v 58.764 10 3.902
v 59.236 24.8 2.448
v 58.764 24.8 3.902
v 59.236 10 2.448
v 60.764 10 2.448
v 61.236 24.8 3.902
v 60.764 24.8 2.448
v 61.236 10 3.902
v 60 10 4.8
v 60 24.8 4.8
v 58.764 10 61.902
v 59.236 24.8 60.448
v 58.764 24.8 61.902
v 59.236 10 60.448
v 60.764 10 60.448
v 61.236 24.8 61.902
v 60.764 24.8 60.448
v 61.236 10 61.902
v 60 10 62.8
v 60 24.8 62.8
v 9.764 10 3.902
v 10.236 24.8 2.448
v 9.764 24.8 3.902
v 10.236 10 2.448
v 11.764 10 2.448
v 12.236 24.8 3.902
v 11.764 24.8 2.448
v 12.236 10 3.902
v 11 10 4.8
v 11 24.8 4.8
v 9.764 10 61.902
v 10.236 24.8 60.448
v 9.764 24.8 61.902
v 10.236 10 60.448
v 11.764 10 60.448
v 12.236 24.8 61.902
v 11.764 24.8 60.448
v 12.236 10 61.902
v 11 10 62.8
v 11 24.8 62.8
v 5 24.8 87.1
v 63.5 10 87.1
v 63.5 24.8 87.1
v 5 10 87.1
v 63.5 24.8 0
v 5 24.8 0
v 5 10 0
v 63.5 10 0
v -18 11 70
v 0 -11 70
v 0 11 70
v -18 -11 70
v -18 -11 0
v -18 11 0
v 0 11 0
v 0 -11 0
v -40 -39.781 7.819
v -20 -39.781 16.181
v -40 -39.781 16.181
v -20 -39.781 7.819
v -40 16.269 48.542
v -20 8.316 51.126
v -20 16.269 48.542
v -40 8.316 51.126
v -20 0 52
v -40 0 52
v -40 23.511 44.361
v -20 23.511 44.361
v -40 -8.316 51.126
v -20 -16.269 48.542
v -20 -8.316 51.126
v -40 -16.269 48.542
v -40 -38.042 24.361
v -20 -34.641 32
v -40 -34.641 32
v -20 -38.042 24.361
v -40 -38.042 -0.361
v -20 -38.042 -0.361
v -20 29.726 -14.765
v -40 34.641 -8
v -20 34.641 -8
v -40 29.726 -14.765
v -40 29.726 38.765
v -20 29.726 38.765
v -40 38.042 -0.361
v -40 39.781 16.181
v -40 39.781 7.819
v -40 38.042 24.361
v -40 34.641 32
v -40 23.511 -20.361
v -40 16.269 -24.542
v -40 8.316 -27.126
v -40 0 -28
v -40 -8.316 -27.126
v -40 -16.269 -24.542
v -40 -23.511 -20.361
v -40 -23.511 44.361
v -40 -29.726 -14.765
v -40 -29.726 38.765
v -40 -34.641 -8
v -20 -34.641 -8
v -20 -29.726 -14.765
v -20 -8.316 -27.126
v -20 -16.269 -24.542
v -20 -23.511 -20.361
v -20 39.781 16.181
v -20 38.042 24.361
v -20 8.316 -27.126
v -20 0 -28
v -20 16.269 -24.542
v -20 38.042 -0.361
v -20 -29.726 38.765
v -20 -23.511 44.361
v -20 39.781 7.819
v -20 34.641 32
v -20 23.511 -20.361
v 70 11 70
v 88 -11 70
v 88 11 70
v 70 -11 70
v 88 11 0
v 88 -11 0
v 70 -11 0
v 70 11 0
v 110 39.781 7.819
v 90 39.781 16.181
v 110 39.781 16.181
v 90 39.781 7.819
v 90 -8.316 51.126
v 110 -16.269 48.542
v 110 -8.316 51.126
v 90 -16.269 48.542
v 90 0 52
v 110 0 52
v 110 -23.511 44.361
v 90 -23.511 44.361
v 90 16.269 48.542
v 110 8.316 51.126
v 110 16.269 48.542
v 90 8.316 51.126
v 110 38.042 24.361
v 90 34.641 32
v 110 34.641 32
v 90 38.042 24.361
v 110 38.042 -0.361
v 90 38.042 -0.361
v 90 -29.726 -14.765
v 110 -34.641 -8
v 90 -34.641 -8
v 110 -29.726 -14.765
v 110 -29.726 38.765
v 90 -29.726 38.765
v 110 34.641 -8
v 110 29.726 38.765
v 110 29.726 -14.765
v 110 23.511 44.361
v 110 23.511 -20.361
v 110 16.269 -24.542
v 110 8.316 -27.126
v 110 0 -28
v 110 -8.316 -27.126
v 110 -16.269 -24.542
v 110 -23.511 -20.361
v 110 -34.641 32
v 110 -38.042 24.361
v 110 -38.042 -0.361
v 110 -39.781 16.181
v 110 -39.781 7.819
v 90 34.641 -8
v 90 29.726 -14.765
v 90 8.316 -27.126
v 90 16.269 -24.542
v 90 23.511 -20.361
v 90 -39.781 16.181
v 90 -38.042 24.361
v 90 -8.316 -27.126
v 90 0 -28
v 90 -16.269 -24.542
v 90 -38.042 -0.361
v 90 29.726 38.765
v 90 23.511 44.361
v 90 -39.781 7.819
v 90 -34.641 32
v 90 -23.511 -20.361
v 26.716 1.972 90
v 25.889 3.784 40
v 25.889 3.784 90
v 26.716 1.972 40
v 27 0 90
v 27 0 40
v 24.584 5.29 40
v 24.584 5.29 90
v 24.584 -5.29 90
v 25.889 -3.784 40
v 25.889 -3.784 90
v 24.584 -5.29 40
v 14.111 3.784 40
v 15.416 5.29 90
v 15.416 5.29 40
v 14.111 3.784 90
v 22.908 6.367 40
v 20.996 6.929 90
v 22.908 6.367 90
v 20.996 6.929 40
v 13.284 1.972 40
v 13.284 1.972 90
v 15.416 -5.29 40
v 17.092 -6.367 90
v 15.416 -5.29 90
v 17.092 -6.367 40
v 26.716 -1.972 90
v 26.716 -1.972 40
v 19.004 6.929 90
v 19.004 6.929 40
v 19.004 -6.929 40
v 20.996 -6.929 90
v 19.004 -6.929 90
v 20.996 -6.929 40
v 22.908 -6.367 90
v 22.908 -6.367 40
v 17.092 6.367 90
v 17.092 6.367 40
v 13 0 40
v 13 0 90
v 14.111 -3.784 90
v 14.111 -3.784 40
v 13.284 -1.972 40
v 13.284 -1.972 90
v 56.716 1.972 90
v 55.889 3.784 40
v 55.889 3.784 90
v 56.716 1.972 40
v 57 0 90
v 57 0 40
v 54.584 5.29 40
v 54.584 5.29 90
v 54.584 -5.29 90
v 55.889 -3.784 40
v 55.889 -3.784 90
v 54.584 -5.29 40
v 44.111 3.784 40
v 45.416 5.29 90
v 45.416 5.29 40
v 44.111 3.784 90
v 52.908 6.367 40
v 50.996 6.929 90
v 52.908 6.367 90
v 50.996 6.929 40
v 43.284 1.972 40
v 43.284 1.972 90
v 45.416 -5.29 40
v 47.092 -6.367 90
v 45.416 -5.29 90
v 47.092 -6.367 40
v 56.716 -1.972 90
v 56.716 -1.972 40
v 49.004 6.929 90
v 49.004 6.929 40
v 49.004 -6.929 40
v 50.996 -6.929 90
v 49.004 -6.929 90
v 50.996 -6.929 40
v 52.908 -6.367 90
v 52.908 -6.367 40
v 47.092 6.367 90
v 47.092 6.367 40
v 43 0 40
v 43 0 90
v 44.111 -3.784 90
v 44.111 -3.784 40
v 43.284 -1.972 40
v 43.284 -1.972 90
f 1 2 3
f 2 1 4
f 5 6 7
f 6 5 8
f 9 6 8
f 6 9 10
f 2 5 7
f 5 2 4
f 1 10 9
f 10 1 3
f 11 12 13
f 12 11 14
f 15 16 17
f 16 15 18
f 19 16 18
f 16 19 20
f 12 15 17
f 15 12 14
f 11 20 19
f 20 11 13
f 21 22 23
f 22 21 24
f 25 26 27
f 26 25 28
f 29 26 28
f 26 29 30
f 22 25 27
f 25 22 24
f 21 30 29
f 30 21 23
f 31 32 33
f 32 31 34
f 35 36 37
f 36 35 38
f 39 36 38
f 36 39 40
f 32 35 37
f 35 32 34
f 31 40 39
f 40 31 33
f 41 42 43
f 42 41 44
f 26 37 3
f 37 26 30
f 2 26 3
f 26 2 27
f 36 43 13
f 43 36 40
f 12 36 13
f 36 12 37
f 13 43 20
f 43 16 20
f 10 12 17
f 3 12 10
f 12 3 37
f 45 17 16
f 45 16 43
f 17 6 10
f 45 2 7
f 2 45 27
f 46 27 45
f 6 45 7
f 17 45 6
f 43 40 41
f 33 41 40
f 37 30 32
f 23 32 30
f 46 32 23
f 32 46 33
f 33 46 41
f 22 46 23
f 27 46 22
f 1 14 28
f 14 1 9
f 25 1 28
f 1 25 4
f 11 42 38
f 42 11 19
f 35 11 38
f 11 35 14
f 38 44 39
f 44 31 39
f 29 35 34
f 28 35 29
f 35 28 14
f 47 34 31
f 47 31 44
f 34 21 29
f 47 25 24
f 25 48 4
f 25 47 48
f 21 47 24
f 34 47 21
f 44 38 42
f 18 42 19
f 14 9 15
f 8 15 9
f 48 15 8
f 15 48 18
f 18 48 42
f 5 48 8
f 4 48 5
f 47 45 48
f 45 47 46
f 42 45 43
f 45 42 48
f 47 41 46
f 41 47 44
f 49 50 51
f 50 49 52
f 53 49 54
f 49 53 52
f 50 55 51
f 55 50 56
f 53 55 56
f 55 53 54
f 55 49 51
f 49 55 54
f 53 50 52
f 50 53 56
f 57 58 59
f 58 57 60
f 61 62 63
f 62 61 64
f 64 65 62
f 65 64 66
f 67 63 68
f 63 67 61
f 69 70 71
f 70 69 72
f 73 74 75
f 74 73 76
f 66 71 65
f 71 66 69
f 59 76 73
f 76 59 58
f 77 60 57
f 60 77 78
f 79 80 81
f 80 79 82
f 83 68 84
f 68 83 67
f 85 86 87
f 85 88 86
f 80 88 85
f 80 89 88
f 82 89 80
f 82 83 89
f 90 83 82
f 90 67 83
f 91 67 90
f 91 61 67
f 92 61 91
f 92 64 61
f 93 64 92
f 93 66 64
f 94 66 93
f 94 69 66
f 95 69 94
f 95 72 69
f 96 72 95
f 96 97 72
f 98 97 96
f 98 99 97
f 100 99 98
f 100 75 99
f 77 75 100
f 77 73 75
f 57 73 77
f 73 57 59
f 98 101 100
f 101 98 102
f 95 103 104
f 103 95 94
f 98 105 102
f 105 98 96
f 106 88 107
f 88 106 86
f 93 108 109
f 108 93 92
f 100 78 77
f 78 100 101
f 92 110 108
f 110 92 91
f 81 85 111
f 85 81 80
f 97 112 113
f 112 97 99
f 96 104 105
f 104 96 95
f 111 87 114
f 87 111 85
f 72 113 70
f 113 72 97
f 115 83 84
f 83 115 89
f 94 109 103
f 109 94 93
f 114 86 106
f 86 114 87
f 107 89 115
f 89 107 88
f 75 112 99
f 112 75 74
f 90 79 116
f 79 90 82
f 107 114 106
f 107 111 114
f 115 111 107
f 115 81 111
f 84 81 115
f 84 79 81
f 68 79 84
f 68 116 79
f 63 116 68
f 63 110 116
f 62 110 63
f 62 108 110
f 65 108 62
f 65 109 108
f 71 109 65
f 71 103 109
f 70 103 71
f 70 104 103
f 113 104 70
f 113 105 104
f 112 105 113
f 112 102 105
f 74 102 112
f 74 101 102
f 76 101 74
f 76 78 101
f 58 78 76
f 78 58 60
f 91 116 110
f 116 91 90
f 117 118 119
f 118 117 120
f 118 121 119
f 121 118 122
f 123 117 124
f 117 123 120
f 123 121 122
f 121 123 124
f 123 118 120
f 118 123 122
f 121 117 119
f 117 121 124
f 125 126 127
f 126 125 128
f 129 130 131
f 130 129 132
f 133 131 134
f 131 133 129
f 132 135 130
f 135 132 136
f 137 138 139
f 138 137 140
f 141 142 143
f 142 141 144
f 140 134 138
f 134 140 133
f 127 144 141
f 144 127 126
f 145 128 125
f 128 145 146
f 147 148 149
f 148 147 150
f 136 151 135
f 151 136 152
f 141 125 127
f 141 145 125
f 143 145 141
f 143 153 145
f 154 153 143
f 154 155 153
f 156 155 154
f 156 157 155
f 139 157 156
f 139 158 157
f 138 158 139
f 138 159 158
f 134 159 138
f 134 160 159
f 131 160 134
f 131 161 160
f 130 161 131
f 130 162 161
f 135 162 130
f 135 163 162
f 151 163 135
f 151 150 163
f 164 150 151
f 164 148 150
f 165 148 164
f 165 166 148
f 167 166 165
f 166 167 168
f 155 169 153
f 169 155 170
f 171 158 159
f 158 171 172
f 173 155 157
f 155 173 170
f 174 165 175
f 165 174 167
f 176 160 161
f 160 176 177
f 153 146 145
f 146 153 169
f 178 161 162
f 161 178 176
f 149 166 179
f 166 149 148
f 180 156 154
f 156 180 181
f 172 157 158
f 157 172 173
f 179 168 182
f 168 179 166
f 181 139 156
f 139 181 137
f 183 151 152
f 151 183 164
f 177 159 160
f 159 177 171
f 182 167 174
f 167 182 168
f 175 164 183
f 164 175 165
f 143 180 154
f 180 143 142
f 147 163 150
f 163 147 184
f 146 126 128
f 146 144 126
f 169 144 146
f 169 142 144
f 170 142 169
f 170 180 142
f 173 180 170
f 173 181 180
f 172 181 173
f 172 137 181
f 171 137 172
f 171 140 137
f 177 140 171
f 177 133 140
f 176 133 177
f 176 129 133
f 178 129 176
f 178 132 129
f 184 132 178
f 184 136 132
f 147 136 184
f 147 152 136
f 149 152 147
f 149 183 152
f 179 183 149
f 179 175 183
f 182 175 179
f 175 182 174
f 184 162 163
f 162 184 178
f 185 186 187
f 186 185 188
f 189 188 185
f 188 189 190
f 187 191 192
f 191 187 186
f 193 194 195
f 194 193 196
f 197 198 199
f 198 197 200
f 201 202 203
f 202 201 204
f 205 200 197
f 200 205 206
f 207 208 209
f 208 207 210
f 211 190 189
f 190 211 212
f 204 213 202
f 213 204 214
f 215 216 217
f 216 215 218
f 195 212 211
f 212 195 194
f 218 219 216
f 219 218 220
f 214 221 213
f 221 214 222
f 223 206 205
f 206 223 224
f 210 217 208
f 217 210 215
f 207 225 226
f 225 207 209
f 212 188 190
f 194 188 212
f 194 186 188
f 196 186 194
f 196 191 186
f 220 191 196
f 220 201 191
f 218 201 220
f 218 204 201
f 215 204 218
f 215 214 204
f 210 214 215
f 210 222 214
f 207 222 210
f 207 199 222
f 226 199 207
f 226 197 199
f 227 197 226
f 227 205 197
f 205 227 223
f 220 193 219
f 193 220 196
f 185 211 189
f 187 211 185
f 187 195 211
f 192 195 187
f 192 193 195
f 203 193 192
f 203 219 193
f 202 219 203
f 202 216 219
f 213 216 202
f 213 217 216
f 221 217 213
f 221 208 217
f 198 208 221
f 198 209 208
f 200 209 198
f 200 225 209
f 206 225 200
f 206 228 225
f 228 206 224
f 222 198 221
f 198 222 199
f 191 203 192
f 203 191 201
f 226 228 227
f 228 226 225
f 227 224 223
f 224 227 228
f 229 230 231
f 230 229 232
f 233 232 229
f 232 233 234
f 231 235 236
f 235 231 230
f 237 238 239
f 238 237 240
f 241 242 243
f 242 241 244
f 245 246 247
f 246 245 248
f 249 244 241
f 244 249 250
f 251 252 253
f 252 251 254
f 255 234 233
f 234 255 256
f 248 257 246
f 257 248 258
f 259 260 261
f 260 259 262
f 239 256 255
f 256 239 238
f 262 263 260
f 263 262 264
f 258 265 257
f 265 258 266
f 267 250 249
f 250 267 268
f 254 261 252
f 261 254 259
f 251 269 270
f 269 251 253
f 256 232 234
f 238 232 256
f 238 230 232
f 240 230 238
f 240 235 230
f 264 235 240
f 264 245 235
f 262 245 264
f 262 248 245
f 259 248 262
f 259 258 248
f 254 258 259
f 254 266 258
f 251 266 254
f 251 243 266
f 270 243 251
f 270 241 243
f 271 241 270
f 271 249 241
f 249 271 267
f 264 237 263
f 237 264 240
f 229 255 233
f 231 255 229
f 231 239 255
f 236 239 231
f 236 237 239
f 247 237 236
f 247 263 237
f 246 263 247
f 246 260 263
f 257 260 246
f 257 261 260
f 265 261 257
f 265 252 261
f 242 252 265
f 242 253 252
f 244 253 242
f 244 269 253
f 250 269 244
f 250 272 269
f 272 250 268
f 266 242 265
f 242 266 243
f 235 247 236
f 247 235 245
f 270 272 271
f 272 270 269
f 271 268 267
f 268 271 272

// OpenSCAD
module rpi() {
    pi_width=58.5;
    pi_height=14.8;
    pi_length=87.1;
    hole_height=15;
    hole_radius=1.3;
    pi_hole_edge_distance=3.5;
    pi_hole_length_distance=58;
    pi_hole_width_distance=49;
    difference() {
        cube([pi_length,pi_width,pi_height]);
        union() {
            translate([pi_hole_edge_distance,pi_width-pi_hole_edge_distance,-0.1]) 
                cylinder(h=hole_height, r=hole_radius);
            translate([pi_hole_edge_distance+pi_hole_length_distance,pi_width-pi_hole_edge_distance,-0.1]) 
                cylinder(h=hole_height, r=hole_radius);
            
            translate([pi_hole_edge_distance,pi_width-pi_hole_edge_distance-pi_hole_width_distance,-0.1]) 
                cylinder(h=hole_height, r=hole_radius);
            translate([pi_hole_edge_distance+pi_hole_length_distance,pi_width-pi_hole_edge_distance-pi_hole_width_distance,-0.1]) 
                cylinder(h=hole_height, r=hole_radius);
        }
        
    }
    
}

module motor() {
    cube([70,22,18]);
}
module wheel() {
    cylinder(r=40,h=20);
}
module camera() {
    cube([10,10,2]);
}
module battery() {
    cylinder(r=7, h=50);
}
module motorWheel() {
    motor();
    translate([12,11,20])
        wheel();
}
translate([5,10,0])rotate([0,270,270])rpi();
translate([0,-11,0])rotate([0,270,0])motorWheel();
translate([70,11,0])rotate([180,270,0])motorWheel();
translate([20,0,40])battery();
translate([50,0,40])battery();
//camera();
